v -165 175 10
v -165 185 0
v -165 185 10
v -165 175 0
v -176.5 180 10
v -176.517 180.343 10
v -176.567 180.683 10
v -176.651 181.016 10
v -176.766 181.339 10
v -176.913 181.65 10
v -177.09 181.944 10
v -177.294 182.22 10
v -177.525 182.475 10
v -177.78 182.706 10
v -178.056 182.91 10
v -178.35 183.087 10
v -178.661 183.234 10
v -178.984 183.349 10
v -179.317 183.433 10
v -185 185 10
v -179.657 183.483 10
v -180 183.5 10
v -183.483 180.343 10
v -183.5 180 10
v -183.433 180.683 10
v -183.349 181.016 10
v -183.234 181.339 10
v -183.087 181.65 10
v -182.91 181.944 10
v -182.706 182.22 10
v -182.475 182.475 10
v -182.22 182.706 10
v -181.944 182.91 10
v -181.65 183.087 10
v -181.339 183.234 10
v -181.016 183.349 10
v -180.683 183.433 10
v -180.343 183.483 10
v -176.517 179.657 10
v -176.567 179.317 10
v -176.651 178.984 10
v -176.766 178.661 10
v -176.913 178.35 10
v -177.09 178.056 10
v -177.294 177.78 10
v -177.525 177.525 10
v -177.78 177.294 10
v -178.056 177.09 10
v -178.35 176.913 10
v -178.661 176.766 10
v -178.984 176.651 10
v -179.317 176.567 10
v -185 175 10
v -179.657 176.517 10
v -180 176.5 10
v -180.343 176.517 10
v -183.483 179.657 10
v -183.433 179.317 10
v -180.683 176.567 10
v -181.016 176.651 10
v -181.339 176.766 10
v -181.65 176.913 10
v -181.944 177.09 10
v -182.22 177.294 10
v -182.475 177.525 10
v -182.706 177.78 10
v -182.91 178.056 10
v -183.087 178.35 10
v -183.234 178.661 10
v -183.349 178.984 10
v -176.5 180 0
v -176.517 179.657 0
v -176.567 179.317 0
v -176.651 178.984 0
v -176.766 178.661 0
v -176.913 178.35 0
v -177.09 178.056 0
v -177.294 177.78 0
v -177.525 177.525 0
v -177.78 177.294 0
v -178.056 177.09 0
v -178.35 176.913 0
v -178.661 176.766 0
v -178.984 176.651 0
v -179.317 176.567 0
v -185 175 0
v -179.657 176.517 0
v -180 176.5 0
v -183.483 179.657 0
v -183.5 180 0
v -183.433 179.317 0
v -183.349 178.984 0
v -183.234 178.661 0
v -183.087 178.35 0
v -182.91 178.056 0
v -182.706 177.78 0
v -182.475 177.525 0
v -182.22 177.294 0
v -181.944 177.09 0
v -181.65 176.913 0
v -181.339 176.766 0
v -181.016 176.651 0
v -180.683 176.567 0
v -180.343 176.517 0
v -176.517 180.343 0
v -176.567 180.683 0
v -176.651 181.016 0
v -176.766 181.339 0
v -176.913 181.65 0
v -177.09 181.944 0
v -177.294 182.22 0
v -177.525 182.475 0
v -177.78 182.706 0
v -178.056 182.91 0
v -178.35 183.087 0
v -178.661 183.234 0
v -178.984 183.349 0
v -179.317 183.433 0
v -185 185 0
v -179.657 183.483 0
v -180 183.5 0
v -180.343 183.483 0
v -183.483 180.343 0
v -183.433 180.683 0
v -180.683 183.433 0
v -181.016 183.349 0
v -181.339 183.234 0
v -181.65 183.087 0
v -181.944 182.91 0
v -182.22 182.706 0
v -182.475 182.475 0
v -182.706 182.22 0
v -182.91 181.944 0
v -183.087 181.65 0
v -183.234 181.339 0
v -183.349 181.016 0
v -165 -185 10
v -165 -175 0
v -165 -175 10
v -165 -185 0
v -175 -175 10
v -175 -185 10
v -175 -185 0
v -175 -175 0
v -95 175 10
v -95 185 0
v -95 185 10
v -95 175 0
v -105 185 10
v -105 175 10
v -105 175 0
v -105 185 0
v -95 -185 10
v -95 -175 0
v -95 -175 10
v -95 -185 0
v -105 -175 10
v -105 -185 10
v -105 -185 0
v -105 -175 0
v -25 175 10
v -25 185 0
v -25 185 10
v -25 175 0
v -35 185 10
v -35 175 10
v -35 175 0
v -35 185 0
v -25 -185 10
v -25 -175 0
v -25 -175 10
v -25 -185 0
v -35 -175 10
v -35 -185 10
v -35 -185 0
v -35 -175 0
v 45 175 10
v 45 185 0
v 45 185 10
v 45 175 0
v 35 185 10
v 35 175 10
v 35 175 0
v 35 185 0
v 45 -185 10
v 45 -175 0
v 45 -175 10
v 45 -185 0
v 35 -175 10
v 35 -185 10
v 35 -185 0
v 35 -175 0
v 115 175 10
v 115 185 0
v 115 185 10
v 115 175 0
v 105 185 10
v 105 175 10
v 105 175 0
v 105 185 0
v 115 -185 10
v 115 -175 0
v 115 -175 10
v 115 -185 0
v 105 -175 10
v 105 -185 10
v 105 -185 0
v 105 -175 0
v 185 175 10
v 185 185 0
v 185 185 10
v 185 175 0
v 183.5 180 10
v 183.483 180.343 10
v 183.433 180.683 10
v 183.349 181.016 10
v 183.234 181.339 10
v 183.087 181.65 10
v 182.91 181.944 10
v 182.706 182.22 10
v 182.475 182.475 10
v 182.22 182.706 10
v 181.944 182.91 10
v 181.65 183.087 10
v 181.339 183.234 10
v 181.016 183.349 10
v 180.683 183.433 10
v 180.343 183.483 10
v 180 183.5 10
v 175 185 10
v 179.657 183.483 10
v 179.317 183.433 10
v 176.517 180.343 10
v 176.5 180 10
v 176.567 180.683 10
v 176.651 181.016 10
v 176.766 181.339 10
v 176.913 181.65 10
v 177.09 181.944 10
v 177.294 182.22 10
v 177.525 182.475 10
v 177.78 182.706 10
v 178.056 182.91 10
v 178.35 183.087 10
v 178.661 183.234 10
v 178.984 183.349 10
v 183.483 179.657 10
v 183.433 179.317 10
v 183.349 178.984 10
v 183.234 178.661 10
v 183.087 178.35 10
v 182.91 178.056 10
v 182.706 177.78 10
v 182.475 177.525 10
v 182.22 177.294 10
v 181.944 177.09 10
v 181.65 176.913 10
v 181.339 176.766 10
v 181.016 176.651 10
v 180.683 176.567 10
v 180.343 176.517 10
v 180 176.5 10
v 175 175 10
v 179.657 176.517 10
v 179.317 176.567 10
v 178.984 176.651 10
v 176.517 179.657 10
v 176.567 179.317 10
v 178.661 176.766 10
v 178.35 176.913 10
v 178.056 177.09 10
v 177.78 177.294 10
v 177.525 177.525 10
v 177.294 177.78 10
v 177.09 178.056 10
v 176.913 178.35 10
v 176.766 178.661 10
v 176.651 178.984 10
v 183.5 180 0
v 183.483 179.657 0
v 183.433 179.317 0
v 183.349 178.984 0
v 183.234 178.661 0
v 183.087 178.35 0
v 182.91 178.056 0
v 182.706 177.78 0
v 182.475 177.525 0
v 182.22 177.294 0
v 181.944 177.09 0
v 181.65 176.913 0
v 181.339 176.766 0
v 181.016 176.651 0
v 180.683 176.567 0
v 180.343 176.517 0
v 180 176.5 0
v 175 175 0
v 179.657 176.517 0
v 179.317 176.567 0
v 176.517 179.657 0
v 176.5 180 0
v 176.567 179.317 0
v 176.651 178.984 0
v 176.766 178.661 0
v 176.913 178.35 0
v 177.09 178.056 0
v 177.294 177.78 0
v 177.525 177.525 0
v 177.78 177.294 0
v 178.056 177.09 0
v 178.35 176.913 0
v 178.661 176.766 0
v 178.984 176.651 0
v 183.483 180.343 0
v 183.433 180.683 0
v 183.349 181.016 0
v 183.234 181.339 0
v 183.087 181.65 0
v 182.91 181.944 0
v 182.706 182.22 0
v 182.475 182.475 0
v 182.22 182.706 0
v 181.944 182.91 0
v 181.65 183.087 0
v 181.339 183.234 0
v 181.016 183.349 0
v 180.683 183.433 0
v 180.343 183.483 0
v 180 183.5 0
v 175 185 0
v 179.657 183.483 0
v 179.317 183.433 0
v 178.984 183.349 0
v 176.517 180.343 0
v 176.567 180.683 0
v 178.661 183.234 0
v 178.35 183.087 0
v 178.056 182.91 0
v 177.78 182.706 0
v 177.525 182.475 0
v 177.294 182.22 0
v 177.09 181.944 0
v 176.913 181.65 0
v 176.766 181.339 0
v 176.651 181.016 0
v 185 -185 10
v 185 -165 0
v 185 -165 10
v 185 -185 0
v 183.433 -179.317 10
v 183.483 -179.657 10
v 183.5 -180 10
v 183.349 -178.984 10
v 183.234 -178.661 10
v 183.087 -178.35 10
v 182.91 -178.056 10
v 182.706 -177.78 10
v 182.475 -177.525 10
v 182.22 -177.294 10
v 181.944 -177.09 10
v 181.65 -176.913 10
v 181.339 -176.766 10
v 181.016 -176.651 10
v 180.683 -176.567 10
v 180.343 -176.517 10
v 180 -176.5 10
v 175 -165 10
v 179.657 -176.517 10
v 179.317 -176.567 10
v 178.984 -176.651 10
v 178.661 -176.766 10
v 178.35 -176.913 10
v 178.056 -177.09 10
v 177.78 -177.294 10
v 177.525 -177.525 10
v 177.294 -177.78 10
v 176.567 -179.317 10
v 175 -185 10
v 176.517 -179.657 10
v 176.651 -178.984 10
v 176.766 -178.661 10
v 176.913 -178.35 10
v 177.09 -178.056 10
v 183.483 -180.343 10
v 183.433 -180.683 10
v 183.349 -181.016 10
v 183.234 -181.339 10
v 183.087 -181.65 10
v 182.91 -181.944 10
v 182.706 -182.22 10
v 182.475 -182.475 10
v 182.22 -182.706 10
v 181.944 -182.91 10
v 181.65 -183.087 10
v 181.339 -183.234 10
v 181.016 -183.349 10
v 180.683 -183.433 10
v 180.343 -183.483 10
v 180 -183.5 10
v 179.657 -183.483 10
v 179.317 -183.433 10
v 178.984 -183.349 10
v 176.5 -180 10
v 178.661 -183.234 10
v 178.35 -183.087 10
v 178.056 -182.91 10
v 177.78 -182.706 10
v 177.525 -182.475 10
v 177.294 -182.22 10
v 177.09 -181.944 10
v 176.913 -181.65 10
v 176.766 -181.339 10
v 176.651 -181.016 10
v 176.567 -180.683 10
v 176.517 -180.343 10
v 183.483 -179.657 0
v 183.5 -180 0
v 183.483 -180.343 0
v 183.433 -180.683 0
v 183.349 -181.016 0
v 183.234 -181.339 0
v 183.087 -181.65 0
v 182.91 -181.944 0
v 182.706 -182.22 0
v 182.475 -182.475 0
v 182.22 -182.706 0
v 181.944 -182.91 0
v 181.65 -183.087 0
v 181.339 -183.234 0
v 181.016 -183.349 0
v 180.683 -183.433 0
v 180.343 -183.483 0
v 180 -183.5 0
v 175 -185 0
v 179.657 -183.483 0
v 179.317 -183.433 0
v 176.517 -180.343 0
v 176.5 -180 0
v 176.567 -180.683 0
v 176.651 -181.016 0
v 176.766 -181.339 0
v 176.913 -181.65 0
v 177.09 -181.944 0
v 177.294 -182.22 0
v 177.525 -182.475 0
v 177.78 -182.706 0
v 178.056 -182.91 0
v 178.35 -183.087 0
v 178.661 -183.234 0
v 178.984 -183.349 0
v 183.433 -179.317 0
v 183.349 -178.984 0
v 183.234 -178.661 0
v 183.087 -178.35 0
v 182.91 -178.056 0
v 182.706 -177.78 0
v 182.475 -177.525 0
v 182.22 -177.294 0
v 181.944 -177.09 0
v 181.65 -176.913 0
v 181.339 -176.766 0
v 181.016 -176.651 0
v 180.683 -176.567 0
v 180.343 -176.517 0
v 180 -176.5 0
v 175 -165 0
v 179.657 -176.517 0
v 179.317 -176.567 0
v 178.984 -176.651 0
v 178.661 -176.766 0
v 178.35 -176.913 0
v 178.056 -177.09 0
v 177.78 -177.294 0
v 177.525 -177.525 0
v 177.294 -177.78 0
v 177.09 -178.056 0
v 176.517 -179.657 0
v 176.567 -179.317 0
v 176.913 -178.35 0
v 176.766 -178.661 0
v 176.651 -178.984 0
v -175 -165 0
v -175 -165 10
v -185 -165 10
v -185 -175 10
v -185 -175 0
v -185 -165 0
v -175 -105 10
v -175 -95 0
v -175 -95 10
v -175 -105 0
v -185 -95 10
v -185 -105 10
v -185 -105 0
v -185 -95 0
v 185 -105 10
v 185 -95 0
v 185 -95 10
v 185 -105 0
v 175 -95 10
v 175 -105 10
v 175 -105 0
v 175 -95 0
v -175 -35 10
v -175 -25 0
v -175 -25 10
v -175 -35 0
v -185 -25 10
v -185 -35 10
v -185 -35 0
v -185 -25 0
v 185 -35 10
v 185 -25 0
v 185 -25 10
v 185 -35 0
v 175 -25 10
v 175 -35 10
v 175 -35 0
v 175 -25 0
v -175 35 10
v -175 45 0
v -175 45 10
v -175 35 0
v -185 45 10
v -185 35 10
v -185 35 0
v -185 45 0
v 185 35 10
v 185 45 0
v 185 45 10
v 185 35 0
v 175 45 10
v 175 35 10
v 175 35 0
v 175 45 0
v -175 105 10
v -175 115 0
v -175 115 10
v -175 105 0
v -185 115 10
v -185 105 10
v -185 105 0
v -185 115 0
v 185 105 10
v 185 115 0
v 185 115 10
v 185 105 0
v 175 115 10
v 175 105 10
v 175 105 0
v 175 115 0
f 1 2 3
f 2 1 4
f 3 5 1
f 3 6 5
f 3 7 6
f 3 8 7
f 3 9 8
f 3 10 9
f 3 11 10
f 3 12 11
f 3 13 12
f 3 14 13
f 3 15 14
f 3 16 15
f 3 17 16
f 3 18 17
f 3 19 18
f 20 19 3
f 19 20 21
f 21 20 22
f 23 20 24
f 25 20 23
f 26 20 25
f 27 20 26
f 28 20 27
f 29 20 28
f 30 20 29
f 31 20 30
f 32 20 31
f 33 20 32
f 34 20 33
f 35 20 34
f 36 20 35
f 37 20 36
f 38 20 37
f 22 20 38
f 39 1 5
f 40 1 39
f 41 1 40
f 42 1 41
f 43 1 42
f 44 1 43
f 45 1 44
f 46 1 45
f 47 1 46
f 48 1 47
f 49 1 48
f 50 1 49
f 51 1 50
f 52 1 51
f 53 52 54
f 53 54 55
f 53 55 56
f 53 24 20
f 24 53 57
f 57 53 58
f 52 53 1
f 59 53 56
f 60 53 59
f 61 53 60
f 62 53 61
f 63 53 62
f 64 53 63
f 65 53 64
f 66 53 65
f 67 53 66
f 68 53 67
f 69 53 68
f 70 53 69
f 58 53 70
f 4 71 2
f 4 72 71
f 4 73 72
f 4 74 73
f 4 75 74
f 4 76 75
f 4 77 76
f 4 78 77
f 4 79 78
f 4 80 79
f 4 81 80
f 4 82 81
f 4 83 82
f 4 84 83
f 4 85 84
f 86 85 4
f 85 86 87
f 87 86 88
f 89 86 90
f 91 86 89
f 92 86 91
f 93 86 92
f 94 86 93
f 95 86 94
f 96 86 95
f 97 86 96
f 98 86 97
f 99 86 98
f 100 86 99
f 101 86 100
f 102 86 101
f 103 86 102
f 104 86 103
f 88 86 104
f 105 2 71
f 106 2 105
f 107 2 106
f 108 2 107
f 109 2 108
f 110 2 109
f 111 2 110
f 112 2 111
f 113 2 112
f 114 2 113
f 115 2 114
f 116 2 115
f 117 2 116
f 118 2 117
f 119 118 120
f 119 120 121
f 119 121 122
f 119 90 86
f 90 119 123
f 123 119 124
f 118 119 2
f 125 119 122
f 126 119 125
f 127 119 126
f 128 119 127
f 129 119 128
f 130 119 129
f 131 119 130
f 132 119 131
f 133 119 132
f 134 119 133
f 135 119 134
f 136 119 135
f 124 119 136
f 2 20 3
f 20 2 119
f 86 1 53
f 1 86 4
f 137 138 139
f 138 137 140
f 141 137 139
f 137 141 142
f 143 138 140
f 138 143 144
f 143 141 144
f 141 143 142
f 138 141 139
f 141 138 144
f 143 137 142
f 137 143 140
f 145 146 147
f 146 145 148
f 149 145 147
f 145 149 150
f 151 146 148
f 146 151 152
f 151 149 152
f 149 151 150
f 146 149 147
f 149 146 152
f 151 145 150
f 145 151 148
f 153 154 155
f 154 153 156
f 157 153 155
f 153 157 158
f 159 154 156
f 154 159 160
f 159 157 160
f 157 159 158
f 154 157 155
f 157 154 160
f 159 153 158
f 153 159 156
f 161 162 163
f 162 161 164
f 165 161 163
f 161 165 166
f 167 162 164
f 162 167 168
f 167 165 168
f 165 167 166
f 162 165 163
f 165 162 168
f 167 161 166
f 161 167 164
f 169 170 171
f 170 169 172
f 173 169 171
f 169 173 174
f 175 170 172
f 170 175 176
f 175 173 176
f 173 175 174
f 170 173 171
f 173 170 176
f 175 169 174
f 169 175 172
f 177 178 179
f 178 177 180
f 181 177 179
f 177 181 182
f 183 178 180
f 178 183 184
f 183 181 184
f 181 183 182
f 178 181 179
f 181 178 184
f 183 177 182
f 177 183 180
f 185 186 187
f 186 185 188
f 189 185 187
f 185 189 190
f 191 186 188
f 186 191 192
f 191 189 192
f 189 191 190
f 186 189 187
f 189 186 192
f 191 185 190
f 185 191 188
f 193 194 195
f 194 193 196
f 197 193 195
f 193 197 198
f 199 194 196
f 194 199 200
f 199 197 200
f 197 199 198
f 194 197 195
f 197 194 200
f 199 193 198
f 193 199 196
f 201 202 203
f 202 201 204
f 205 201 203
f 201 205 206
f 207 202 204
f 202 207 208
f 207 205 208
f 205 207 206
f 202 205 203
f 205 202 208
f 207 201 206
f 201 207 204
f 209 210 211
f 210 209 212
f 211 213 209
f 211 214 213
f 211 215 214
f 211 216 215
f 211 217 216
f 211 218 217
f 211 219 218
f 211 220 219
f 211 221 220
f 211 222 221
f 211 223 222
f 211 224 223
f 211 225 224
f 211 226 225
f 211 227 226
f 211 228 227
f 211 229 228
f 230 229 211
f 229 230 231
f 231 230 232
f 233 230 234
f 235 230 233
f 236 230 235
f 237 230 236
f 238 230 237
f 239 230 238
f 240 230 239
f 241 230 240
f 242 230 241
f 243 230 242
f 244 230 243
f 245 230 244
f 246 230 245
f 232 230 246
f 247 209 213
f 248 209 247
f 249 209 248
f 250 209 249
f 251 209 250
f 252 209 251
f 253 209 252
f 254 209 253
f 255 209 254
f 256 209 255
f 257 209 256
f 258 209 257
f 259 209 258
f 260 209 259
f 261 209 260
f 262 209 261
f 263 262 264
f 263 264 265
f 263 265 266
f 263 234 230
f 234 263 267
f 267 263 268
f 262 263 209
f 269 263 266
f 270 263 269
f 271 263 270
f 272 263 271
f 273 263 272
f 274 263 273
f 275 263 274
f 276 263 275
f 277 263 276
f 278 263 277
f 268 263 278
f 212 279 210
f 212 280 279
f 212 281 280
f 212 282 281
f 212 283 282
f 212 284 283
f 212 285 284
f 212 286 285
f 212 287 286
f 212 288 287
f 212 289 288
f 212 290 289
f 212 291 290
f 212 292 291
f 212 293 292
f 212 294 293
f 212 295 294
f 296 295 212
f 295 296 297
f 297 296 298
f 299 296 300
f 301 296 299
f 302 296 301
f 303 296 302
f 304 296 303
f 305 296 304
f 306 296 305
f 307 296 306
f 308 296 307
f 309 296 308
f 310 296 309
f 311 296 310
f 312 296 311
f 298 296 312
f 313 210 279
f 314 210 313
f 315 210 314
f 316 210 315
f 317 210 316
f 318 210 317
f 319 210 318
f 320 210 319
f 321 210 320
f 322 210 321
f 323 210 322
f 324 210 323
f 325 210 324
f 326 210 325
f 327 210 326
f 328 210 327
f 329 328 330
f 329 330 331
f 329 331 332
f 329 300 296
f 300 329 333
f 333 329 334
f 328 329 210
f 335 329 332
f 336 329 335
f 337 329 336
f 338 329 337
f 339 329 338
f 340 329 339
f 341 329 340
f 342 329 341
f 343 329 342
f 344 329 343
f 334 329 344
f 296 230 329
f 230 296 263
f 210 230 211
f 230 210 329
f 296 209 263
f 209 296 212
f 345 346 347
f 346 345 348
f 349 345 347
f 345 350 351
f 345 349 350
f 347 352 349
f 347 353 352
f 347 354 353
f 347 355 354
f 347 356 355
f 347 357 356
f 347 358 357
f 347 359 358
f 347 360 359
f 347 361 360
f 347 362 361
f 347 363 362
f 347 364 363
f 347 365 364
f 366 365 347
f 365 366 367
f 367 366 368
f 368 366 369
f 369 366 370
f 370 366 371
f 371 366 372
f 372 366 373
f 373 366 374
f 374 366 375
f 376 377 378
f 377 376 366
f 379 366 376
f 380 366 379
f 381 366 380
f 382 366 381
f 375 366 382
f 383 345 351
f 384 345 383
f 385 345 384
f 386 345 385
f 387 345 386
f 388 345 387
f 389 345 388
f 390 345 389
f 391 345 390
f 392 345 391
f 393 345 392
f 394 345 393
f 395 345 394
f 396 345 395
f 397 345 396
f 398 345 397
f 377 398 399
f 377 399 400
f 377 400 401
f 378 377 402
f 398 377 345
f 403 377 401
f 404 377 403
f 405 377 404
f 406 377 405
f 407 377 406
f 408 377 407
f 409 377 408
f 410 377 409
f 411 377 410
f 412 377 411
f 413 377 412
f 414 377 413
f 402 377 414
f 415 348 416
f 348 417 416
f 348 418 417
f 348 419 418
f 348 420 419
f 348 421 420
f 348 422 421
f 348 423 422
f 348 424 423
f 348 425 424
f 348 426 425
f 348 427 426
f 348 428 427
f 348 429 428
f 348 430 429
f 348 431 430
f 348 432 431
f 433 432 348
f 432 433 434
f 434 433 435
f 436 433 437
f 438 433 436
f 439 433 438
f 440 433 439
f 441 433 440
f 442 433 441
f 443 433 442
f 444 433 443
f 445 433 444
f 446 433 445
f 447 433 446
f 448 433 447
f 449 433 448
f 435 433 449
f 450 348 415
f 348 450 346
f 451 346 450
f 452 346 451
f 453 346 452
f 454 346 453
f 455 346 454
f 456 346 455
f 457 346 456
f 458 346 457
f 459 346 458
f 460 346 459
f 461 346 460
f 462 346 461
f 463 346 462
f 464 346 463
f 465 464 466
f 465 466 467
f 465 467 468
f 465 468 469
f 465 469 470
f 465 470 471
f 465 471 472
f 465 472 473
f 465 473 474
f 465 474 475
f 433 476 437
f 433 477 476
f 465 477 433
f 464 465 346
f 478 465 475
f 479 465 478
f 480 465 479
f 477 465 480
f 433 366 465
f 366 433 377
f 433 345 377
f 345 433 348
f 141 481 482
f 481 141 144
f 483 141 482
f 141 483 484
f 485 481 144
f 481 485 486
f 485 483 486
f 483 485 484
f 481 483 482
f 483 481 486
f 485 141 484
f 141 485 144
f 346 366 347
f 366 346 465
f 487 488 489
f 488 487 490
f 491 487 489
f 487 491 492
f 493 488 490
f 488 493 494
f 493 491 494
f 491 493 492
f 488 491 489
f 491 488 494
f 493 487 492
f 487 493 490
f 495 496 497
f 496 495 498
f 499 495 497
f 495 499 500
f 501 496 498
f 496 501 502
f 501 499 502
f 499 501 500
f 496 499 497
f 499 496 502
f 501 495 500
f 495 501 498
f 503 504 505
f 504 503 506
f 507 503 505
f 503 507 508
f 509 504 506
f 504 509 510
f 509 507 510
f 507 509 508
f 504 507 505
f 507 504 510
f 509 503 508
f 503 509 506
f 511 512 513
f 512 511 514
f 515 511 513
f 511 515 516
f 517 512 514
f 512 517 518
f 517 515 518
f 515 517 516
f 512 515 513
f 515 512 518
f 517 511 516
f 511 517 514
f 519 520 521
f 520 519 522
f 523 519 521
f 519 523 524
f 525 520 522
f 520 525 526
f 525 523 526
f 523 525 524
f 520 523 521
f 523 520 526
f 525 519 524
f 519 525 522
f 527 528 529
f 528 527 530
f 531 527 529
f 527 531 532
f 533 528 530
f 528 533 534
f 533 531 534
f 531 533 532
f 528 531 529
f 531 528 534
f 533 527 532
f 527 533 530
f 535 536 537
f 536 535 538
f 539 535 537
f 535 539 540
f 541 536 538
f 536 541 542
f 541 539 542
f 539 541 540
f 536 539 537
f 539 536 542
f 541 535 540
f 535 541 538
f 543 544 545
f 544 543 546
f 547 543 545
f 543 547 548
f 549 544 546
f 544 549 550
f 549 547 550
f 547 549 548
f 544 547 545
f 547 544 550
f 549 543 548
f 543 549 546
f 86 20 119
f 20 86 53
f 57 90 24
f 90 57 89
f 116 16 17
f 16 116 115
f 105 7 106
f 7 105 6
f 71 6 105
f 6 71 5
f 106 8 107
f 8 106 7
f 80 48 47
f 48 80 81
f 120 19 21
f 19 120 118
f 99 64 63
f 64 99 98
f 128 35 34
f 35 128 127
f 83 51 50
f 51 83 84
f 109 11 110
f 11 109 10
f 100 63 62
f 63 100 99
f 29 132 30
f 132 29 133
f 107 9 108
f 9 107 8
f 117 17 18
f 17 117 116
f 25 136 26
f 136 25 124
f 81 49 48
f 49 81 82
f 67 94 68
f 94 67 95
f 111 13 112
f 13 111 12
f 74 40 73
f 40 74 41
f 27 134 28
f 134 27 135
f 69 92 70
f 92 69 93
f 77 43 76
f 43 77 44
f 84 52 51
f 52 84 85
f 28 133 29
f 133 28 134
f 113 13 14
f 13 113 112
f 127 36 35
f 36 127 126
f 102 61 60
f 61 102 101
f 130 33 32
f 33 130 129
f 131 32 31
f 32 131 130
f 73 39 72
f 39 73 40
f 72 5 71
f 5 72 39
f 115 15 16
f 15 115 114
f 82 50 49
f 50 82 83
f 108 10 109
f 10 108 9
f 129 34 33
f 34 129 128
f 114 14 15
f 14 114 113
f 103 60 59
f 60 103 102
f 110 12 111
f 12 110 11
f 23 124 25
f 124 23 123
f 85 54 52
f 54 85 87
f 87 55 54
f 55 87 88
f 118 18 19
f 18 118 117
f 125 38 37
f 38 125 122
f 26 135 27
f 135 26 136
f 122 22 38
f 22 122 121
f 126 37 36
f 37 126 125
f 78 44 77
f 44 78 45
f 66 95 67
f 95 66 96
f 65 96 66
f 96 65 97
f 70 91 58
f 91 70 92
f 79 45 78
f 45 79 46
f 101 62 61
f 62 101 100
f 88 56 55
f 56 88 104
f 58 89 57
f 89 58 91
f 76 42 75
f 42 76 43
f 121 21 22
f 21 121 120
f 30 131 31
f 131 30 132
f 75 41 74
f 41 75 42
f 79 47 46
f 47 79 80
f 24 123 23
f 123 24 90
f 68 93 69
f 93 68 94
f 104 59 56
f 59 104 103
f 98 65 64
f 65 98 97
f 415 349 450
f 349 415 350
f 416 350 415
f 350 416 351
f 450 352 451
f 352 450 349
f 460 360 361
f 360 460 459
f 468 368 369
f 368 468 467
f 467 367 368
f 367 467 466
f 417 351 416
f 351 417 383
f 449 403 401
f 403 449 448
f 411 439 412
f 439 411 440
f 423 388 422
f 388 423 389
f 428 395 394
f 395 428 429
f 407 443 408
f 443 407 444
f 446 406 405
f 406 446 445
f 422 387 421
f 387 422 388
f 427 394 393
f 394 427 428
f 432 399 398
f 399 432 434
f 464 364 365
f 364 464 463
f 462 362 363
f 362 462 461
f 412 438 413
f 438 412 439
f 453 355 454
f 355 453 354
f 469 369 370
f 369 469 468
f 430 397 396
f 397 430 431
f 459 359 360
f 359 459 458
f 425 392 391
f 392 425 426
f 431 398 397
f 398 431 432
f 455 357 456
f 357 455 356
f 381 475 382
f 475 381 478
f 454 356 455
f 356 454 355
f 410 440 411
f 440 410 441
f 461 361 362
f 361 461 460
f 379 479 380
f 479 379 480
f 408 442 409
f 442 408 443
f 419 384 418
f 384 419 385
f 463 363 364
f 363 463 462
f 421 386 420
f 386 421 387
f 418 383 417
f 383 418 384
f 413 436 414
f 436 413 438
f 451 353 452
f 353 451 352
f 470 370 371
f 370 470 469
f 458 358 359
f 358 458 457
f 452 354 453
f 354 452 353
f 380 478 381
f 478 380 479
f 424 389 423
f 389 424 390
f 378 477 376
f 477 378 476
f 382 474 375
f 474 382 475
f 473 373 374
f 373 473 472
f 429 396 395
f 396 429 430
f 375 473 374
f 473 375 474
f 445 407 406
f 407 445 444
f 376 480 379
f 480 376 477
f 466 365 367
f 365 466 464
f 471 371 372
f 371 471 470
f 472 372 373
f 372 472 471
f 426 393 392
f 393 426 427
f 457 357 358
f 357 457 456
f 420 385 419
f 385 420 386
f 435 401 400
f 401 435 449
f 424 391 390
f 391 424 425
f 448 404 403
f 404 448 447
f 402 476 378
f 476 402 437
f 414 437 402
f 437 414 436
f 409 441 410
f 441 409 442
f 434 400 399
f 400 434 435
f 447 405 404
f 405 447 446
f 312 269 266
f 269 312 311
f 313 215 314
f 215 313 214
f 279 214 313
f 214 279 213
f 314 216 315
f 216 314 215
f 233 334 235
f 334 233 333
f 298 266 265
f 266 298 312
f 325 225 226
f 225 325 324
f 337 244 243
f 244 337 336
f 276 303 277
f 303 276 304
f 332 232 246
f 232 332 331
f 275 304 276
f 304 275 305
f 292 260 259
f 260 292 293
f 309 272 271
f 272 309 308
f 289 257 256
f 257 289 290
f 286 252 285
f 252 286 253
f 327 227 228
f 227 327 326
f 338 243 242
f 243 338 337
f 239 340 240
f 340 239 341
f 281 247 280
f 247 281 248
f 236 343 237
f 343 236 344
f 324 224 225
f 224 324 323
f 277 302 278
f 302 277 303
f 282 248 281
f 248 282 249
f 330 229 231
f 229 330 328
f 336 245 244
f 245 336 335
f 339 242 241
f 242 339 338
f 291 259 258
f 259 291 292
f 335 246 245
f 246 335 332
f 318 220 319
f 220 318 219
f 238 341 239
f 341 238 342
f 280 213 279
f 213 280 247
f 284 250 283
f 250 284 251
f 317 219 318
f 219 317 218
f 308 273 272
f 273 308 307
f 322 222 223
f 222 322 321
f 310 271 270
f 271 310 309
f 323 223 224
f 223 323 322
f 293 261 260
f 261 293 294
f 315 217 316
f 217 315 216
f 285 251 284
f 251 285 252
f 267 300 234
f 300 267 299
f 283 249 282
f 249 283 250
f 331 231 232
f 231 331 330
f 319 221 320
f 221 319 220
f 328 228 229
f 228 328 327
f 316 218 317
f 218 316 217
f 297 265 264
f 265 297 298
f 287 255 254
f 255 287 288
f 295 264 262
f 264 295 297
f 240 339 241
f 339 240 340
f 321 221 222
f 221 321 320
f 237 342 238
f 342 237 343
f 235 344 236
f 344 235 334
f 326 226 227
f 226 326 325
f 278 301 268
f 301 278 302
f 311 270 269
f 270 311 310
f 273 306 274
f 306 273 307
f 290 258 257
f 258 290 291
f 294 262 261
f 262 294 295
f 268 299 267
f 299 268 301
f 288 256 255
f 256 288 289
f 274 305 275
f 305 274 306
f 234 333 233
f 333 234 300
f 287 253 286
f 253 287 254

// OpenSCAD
// ring_25.scad - ring index 25 (z bottom = 250 mm)
$fn = 64; bar = 10; half_b = bar/2; outer = 370; half_outer = outer/2;
front_y = 180; back_y = -180; left_x = -180; right_x = 180;
x_centers = [-170, -100, -30, 40, 110, 180];
z_centers = [5, 85, 155, 225, 295, 365, 435, 505, 575, 645, 715]; ring_z = 250;
module place_box(cx, cy, sx, sy) { translate([cx - sx/2, cy - sy/2, 0]) cube([sx, sy, bar]); }

difference() { union() {
    for (x = x_centers) { place_box(x, front_y, bar, bar); place_box(x, back_y, bar, bar); }
    for (y = x_centers) { place_box(left_x, y, bar, bar); place_box(right_x, y, bar, bar); }
    for (zc = z_centers) if ((zc - half_b < ring_z + bar) && (zc + half_b > ring_z)) {
        translate([-half_outer, front_y - half_b, 0]) cube([outer, bar, bar]);
        translate([-half_outer, back_y - half_b, 0])  cube([outer, bar, bar]);
        translate([left_x - half_b, -half_outer, 0])  cube([bar, outer, bar]);
        translate([right_x - half_b, -half_outer, 0]) cube([bar, outer, bar]);
    }
  }
  for (cx = [-180, 180]) for (cy = [-180, 180]) translate([cx, cy, 0]) cylinder(h = bar, r = 3.5, $fn = 64);
}
